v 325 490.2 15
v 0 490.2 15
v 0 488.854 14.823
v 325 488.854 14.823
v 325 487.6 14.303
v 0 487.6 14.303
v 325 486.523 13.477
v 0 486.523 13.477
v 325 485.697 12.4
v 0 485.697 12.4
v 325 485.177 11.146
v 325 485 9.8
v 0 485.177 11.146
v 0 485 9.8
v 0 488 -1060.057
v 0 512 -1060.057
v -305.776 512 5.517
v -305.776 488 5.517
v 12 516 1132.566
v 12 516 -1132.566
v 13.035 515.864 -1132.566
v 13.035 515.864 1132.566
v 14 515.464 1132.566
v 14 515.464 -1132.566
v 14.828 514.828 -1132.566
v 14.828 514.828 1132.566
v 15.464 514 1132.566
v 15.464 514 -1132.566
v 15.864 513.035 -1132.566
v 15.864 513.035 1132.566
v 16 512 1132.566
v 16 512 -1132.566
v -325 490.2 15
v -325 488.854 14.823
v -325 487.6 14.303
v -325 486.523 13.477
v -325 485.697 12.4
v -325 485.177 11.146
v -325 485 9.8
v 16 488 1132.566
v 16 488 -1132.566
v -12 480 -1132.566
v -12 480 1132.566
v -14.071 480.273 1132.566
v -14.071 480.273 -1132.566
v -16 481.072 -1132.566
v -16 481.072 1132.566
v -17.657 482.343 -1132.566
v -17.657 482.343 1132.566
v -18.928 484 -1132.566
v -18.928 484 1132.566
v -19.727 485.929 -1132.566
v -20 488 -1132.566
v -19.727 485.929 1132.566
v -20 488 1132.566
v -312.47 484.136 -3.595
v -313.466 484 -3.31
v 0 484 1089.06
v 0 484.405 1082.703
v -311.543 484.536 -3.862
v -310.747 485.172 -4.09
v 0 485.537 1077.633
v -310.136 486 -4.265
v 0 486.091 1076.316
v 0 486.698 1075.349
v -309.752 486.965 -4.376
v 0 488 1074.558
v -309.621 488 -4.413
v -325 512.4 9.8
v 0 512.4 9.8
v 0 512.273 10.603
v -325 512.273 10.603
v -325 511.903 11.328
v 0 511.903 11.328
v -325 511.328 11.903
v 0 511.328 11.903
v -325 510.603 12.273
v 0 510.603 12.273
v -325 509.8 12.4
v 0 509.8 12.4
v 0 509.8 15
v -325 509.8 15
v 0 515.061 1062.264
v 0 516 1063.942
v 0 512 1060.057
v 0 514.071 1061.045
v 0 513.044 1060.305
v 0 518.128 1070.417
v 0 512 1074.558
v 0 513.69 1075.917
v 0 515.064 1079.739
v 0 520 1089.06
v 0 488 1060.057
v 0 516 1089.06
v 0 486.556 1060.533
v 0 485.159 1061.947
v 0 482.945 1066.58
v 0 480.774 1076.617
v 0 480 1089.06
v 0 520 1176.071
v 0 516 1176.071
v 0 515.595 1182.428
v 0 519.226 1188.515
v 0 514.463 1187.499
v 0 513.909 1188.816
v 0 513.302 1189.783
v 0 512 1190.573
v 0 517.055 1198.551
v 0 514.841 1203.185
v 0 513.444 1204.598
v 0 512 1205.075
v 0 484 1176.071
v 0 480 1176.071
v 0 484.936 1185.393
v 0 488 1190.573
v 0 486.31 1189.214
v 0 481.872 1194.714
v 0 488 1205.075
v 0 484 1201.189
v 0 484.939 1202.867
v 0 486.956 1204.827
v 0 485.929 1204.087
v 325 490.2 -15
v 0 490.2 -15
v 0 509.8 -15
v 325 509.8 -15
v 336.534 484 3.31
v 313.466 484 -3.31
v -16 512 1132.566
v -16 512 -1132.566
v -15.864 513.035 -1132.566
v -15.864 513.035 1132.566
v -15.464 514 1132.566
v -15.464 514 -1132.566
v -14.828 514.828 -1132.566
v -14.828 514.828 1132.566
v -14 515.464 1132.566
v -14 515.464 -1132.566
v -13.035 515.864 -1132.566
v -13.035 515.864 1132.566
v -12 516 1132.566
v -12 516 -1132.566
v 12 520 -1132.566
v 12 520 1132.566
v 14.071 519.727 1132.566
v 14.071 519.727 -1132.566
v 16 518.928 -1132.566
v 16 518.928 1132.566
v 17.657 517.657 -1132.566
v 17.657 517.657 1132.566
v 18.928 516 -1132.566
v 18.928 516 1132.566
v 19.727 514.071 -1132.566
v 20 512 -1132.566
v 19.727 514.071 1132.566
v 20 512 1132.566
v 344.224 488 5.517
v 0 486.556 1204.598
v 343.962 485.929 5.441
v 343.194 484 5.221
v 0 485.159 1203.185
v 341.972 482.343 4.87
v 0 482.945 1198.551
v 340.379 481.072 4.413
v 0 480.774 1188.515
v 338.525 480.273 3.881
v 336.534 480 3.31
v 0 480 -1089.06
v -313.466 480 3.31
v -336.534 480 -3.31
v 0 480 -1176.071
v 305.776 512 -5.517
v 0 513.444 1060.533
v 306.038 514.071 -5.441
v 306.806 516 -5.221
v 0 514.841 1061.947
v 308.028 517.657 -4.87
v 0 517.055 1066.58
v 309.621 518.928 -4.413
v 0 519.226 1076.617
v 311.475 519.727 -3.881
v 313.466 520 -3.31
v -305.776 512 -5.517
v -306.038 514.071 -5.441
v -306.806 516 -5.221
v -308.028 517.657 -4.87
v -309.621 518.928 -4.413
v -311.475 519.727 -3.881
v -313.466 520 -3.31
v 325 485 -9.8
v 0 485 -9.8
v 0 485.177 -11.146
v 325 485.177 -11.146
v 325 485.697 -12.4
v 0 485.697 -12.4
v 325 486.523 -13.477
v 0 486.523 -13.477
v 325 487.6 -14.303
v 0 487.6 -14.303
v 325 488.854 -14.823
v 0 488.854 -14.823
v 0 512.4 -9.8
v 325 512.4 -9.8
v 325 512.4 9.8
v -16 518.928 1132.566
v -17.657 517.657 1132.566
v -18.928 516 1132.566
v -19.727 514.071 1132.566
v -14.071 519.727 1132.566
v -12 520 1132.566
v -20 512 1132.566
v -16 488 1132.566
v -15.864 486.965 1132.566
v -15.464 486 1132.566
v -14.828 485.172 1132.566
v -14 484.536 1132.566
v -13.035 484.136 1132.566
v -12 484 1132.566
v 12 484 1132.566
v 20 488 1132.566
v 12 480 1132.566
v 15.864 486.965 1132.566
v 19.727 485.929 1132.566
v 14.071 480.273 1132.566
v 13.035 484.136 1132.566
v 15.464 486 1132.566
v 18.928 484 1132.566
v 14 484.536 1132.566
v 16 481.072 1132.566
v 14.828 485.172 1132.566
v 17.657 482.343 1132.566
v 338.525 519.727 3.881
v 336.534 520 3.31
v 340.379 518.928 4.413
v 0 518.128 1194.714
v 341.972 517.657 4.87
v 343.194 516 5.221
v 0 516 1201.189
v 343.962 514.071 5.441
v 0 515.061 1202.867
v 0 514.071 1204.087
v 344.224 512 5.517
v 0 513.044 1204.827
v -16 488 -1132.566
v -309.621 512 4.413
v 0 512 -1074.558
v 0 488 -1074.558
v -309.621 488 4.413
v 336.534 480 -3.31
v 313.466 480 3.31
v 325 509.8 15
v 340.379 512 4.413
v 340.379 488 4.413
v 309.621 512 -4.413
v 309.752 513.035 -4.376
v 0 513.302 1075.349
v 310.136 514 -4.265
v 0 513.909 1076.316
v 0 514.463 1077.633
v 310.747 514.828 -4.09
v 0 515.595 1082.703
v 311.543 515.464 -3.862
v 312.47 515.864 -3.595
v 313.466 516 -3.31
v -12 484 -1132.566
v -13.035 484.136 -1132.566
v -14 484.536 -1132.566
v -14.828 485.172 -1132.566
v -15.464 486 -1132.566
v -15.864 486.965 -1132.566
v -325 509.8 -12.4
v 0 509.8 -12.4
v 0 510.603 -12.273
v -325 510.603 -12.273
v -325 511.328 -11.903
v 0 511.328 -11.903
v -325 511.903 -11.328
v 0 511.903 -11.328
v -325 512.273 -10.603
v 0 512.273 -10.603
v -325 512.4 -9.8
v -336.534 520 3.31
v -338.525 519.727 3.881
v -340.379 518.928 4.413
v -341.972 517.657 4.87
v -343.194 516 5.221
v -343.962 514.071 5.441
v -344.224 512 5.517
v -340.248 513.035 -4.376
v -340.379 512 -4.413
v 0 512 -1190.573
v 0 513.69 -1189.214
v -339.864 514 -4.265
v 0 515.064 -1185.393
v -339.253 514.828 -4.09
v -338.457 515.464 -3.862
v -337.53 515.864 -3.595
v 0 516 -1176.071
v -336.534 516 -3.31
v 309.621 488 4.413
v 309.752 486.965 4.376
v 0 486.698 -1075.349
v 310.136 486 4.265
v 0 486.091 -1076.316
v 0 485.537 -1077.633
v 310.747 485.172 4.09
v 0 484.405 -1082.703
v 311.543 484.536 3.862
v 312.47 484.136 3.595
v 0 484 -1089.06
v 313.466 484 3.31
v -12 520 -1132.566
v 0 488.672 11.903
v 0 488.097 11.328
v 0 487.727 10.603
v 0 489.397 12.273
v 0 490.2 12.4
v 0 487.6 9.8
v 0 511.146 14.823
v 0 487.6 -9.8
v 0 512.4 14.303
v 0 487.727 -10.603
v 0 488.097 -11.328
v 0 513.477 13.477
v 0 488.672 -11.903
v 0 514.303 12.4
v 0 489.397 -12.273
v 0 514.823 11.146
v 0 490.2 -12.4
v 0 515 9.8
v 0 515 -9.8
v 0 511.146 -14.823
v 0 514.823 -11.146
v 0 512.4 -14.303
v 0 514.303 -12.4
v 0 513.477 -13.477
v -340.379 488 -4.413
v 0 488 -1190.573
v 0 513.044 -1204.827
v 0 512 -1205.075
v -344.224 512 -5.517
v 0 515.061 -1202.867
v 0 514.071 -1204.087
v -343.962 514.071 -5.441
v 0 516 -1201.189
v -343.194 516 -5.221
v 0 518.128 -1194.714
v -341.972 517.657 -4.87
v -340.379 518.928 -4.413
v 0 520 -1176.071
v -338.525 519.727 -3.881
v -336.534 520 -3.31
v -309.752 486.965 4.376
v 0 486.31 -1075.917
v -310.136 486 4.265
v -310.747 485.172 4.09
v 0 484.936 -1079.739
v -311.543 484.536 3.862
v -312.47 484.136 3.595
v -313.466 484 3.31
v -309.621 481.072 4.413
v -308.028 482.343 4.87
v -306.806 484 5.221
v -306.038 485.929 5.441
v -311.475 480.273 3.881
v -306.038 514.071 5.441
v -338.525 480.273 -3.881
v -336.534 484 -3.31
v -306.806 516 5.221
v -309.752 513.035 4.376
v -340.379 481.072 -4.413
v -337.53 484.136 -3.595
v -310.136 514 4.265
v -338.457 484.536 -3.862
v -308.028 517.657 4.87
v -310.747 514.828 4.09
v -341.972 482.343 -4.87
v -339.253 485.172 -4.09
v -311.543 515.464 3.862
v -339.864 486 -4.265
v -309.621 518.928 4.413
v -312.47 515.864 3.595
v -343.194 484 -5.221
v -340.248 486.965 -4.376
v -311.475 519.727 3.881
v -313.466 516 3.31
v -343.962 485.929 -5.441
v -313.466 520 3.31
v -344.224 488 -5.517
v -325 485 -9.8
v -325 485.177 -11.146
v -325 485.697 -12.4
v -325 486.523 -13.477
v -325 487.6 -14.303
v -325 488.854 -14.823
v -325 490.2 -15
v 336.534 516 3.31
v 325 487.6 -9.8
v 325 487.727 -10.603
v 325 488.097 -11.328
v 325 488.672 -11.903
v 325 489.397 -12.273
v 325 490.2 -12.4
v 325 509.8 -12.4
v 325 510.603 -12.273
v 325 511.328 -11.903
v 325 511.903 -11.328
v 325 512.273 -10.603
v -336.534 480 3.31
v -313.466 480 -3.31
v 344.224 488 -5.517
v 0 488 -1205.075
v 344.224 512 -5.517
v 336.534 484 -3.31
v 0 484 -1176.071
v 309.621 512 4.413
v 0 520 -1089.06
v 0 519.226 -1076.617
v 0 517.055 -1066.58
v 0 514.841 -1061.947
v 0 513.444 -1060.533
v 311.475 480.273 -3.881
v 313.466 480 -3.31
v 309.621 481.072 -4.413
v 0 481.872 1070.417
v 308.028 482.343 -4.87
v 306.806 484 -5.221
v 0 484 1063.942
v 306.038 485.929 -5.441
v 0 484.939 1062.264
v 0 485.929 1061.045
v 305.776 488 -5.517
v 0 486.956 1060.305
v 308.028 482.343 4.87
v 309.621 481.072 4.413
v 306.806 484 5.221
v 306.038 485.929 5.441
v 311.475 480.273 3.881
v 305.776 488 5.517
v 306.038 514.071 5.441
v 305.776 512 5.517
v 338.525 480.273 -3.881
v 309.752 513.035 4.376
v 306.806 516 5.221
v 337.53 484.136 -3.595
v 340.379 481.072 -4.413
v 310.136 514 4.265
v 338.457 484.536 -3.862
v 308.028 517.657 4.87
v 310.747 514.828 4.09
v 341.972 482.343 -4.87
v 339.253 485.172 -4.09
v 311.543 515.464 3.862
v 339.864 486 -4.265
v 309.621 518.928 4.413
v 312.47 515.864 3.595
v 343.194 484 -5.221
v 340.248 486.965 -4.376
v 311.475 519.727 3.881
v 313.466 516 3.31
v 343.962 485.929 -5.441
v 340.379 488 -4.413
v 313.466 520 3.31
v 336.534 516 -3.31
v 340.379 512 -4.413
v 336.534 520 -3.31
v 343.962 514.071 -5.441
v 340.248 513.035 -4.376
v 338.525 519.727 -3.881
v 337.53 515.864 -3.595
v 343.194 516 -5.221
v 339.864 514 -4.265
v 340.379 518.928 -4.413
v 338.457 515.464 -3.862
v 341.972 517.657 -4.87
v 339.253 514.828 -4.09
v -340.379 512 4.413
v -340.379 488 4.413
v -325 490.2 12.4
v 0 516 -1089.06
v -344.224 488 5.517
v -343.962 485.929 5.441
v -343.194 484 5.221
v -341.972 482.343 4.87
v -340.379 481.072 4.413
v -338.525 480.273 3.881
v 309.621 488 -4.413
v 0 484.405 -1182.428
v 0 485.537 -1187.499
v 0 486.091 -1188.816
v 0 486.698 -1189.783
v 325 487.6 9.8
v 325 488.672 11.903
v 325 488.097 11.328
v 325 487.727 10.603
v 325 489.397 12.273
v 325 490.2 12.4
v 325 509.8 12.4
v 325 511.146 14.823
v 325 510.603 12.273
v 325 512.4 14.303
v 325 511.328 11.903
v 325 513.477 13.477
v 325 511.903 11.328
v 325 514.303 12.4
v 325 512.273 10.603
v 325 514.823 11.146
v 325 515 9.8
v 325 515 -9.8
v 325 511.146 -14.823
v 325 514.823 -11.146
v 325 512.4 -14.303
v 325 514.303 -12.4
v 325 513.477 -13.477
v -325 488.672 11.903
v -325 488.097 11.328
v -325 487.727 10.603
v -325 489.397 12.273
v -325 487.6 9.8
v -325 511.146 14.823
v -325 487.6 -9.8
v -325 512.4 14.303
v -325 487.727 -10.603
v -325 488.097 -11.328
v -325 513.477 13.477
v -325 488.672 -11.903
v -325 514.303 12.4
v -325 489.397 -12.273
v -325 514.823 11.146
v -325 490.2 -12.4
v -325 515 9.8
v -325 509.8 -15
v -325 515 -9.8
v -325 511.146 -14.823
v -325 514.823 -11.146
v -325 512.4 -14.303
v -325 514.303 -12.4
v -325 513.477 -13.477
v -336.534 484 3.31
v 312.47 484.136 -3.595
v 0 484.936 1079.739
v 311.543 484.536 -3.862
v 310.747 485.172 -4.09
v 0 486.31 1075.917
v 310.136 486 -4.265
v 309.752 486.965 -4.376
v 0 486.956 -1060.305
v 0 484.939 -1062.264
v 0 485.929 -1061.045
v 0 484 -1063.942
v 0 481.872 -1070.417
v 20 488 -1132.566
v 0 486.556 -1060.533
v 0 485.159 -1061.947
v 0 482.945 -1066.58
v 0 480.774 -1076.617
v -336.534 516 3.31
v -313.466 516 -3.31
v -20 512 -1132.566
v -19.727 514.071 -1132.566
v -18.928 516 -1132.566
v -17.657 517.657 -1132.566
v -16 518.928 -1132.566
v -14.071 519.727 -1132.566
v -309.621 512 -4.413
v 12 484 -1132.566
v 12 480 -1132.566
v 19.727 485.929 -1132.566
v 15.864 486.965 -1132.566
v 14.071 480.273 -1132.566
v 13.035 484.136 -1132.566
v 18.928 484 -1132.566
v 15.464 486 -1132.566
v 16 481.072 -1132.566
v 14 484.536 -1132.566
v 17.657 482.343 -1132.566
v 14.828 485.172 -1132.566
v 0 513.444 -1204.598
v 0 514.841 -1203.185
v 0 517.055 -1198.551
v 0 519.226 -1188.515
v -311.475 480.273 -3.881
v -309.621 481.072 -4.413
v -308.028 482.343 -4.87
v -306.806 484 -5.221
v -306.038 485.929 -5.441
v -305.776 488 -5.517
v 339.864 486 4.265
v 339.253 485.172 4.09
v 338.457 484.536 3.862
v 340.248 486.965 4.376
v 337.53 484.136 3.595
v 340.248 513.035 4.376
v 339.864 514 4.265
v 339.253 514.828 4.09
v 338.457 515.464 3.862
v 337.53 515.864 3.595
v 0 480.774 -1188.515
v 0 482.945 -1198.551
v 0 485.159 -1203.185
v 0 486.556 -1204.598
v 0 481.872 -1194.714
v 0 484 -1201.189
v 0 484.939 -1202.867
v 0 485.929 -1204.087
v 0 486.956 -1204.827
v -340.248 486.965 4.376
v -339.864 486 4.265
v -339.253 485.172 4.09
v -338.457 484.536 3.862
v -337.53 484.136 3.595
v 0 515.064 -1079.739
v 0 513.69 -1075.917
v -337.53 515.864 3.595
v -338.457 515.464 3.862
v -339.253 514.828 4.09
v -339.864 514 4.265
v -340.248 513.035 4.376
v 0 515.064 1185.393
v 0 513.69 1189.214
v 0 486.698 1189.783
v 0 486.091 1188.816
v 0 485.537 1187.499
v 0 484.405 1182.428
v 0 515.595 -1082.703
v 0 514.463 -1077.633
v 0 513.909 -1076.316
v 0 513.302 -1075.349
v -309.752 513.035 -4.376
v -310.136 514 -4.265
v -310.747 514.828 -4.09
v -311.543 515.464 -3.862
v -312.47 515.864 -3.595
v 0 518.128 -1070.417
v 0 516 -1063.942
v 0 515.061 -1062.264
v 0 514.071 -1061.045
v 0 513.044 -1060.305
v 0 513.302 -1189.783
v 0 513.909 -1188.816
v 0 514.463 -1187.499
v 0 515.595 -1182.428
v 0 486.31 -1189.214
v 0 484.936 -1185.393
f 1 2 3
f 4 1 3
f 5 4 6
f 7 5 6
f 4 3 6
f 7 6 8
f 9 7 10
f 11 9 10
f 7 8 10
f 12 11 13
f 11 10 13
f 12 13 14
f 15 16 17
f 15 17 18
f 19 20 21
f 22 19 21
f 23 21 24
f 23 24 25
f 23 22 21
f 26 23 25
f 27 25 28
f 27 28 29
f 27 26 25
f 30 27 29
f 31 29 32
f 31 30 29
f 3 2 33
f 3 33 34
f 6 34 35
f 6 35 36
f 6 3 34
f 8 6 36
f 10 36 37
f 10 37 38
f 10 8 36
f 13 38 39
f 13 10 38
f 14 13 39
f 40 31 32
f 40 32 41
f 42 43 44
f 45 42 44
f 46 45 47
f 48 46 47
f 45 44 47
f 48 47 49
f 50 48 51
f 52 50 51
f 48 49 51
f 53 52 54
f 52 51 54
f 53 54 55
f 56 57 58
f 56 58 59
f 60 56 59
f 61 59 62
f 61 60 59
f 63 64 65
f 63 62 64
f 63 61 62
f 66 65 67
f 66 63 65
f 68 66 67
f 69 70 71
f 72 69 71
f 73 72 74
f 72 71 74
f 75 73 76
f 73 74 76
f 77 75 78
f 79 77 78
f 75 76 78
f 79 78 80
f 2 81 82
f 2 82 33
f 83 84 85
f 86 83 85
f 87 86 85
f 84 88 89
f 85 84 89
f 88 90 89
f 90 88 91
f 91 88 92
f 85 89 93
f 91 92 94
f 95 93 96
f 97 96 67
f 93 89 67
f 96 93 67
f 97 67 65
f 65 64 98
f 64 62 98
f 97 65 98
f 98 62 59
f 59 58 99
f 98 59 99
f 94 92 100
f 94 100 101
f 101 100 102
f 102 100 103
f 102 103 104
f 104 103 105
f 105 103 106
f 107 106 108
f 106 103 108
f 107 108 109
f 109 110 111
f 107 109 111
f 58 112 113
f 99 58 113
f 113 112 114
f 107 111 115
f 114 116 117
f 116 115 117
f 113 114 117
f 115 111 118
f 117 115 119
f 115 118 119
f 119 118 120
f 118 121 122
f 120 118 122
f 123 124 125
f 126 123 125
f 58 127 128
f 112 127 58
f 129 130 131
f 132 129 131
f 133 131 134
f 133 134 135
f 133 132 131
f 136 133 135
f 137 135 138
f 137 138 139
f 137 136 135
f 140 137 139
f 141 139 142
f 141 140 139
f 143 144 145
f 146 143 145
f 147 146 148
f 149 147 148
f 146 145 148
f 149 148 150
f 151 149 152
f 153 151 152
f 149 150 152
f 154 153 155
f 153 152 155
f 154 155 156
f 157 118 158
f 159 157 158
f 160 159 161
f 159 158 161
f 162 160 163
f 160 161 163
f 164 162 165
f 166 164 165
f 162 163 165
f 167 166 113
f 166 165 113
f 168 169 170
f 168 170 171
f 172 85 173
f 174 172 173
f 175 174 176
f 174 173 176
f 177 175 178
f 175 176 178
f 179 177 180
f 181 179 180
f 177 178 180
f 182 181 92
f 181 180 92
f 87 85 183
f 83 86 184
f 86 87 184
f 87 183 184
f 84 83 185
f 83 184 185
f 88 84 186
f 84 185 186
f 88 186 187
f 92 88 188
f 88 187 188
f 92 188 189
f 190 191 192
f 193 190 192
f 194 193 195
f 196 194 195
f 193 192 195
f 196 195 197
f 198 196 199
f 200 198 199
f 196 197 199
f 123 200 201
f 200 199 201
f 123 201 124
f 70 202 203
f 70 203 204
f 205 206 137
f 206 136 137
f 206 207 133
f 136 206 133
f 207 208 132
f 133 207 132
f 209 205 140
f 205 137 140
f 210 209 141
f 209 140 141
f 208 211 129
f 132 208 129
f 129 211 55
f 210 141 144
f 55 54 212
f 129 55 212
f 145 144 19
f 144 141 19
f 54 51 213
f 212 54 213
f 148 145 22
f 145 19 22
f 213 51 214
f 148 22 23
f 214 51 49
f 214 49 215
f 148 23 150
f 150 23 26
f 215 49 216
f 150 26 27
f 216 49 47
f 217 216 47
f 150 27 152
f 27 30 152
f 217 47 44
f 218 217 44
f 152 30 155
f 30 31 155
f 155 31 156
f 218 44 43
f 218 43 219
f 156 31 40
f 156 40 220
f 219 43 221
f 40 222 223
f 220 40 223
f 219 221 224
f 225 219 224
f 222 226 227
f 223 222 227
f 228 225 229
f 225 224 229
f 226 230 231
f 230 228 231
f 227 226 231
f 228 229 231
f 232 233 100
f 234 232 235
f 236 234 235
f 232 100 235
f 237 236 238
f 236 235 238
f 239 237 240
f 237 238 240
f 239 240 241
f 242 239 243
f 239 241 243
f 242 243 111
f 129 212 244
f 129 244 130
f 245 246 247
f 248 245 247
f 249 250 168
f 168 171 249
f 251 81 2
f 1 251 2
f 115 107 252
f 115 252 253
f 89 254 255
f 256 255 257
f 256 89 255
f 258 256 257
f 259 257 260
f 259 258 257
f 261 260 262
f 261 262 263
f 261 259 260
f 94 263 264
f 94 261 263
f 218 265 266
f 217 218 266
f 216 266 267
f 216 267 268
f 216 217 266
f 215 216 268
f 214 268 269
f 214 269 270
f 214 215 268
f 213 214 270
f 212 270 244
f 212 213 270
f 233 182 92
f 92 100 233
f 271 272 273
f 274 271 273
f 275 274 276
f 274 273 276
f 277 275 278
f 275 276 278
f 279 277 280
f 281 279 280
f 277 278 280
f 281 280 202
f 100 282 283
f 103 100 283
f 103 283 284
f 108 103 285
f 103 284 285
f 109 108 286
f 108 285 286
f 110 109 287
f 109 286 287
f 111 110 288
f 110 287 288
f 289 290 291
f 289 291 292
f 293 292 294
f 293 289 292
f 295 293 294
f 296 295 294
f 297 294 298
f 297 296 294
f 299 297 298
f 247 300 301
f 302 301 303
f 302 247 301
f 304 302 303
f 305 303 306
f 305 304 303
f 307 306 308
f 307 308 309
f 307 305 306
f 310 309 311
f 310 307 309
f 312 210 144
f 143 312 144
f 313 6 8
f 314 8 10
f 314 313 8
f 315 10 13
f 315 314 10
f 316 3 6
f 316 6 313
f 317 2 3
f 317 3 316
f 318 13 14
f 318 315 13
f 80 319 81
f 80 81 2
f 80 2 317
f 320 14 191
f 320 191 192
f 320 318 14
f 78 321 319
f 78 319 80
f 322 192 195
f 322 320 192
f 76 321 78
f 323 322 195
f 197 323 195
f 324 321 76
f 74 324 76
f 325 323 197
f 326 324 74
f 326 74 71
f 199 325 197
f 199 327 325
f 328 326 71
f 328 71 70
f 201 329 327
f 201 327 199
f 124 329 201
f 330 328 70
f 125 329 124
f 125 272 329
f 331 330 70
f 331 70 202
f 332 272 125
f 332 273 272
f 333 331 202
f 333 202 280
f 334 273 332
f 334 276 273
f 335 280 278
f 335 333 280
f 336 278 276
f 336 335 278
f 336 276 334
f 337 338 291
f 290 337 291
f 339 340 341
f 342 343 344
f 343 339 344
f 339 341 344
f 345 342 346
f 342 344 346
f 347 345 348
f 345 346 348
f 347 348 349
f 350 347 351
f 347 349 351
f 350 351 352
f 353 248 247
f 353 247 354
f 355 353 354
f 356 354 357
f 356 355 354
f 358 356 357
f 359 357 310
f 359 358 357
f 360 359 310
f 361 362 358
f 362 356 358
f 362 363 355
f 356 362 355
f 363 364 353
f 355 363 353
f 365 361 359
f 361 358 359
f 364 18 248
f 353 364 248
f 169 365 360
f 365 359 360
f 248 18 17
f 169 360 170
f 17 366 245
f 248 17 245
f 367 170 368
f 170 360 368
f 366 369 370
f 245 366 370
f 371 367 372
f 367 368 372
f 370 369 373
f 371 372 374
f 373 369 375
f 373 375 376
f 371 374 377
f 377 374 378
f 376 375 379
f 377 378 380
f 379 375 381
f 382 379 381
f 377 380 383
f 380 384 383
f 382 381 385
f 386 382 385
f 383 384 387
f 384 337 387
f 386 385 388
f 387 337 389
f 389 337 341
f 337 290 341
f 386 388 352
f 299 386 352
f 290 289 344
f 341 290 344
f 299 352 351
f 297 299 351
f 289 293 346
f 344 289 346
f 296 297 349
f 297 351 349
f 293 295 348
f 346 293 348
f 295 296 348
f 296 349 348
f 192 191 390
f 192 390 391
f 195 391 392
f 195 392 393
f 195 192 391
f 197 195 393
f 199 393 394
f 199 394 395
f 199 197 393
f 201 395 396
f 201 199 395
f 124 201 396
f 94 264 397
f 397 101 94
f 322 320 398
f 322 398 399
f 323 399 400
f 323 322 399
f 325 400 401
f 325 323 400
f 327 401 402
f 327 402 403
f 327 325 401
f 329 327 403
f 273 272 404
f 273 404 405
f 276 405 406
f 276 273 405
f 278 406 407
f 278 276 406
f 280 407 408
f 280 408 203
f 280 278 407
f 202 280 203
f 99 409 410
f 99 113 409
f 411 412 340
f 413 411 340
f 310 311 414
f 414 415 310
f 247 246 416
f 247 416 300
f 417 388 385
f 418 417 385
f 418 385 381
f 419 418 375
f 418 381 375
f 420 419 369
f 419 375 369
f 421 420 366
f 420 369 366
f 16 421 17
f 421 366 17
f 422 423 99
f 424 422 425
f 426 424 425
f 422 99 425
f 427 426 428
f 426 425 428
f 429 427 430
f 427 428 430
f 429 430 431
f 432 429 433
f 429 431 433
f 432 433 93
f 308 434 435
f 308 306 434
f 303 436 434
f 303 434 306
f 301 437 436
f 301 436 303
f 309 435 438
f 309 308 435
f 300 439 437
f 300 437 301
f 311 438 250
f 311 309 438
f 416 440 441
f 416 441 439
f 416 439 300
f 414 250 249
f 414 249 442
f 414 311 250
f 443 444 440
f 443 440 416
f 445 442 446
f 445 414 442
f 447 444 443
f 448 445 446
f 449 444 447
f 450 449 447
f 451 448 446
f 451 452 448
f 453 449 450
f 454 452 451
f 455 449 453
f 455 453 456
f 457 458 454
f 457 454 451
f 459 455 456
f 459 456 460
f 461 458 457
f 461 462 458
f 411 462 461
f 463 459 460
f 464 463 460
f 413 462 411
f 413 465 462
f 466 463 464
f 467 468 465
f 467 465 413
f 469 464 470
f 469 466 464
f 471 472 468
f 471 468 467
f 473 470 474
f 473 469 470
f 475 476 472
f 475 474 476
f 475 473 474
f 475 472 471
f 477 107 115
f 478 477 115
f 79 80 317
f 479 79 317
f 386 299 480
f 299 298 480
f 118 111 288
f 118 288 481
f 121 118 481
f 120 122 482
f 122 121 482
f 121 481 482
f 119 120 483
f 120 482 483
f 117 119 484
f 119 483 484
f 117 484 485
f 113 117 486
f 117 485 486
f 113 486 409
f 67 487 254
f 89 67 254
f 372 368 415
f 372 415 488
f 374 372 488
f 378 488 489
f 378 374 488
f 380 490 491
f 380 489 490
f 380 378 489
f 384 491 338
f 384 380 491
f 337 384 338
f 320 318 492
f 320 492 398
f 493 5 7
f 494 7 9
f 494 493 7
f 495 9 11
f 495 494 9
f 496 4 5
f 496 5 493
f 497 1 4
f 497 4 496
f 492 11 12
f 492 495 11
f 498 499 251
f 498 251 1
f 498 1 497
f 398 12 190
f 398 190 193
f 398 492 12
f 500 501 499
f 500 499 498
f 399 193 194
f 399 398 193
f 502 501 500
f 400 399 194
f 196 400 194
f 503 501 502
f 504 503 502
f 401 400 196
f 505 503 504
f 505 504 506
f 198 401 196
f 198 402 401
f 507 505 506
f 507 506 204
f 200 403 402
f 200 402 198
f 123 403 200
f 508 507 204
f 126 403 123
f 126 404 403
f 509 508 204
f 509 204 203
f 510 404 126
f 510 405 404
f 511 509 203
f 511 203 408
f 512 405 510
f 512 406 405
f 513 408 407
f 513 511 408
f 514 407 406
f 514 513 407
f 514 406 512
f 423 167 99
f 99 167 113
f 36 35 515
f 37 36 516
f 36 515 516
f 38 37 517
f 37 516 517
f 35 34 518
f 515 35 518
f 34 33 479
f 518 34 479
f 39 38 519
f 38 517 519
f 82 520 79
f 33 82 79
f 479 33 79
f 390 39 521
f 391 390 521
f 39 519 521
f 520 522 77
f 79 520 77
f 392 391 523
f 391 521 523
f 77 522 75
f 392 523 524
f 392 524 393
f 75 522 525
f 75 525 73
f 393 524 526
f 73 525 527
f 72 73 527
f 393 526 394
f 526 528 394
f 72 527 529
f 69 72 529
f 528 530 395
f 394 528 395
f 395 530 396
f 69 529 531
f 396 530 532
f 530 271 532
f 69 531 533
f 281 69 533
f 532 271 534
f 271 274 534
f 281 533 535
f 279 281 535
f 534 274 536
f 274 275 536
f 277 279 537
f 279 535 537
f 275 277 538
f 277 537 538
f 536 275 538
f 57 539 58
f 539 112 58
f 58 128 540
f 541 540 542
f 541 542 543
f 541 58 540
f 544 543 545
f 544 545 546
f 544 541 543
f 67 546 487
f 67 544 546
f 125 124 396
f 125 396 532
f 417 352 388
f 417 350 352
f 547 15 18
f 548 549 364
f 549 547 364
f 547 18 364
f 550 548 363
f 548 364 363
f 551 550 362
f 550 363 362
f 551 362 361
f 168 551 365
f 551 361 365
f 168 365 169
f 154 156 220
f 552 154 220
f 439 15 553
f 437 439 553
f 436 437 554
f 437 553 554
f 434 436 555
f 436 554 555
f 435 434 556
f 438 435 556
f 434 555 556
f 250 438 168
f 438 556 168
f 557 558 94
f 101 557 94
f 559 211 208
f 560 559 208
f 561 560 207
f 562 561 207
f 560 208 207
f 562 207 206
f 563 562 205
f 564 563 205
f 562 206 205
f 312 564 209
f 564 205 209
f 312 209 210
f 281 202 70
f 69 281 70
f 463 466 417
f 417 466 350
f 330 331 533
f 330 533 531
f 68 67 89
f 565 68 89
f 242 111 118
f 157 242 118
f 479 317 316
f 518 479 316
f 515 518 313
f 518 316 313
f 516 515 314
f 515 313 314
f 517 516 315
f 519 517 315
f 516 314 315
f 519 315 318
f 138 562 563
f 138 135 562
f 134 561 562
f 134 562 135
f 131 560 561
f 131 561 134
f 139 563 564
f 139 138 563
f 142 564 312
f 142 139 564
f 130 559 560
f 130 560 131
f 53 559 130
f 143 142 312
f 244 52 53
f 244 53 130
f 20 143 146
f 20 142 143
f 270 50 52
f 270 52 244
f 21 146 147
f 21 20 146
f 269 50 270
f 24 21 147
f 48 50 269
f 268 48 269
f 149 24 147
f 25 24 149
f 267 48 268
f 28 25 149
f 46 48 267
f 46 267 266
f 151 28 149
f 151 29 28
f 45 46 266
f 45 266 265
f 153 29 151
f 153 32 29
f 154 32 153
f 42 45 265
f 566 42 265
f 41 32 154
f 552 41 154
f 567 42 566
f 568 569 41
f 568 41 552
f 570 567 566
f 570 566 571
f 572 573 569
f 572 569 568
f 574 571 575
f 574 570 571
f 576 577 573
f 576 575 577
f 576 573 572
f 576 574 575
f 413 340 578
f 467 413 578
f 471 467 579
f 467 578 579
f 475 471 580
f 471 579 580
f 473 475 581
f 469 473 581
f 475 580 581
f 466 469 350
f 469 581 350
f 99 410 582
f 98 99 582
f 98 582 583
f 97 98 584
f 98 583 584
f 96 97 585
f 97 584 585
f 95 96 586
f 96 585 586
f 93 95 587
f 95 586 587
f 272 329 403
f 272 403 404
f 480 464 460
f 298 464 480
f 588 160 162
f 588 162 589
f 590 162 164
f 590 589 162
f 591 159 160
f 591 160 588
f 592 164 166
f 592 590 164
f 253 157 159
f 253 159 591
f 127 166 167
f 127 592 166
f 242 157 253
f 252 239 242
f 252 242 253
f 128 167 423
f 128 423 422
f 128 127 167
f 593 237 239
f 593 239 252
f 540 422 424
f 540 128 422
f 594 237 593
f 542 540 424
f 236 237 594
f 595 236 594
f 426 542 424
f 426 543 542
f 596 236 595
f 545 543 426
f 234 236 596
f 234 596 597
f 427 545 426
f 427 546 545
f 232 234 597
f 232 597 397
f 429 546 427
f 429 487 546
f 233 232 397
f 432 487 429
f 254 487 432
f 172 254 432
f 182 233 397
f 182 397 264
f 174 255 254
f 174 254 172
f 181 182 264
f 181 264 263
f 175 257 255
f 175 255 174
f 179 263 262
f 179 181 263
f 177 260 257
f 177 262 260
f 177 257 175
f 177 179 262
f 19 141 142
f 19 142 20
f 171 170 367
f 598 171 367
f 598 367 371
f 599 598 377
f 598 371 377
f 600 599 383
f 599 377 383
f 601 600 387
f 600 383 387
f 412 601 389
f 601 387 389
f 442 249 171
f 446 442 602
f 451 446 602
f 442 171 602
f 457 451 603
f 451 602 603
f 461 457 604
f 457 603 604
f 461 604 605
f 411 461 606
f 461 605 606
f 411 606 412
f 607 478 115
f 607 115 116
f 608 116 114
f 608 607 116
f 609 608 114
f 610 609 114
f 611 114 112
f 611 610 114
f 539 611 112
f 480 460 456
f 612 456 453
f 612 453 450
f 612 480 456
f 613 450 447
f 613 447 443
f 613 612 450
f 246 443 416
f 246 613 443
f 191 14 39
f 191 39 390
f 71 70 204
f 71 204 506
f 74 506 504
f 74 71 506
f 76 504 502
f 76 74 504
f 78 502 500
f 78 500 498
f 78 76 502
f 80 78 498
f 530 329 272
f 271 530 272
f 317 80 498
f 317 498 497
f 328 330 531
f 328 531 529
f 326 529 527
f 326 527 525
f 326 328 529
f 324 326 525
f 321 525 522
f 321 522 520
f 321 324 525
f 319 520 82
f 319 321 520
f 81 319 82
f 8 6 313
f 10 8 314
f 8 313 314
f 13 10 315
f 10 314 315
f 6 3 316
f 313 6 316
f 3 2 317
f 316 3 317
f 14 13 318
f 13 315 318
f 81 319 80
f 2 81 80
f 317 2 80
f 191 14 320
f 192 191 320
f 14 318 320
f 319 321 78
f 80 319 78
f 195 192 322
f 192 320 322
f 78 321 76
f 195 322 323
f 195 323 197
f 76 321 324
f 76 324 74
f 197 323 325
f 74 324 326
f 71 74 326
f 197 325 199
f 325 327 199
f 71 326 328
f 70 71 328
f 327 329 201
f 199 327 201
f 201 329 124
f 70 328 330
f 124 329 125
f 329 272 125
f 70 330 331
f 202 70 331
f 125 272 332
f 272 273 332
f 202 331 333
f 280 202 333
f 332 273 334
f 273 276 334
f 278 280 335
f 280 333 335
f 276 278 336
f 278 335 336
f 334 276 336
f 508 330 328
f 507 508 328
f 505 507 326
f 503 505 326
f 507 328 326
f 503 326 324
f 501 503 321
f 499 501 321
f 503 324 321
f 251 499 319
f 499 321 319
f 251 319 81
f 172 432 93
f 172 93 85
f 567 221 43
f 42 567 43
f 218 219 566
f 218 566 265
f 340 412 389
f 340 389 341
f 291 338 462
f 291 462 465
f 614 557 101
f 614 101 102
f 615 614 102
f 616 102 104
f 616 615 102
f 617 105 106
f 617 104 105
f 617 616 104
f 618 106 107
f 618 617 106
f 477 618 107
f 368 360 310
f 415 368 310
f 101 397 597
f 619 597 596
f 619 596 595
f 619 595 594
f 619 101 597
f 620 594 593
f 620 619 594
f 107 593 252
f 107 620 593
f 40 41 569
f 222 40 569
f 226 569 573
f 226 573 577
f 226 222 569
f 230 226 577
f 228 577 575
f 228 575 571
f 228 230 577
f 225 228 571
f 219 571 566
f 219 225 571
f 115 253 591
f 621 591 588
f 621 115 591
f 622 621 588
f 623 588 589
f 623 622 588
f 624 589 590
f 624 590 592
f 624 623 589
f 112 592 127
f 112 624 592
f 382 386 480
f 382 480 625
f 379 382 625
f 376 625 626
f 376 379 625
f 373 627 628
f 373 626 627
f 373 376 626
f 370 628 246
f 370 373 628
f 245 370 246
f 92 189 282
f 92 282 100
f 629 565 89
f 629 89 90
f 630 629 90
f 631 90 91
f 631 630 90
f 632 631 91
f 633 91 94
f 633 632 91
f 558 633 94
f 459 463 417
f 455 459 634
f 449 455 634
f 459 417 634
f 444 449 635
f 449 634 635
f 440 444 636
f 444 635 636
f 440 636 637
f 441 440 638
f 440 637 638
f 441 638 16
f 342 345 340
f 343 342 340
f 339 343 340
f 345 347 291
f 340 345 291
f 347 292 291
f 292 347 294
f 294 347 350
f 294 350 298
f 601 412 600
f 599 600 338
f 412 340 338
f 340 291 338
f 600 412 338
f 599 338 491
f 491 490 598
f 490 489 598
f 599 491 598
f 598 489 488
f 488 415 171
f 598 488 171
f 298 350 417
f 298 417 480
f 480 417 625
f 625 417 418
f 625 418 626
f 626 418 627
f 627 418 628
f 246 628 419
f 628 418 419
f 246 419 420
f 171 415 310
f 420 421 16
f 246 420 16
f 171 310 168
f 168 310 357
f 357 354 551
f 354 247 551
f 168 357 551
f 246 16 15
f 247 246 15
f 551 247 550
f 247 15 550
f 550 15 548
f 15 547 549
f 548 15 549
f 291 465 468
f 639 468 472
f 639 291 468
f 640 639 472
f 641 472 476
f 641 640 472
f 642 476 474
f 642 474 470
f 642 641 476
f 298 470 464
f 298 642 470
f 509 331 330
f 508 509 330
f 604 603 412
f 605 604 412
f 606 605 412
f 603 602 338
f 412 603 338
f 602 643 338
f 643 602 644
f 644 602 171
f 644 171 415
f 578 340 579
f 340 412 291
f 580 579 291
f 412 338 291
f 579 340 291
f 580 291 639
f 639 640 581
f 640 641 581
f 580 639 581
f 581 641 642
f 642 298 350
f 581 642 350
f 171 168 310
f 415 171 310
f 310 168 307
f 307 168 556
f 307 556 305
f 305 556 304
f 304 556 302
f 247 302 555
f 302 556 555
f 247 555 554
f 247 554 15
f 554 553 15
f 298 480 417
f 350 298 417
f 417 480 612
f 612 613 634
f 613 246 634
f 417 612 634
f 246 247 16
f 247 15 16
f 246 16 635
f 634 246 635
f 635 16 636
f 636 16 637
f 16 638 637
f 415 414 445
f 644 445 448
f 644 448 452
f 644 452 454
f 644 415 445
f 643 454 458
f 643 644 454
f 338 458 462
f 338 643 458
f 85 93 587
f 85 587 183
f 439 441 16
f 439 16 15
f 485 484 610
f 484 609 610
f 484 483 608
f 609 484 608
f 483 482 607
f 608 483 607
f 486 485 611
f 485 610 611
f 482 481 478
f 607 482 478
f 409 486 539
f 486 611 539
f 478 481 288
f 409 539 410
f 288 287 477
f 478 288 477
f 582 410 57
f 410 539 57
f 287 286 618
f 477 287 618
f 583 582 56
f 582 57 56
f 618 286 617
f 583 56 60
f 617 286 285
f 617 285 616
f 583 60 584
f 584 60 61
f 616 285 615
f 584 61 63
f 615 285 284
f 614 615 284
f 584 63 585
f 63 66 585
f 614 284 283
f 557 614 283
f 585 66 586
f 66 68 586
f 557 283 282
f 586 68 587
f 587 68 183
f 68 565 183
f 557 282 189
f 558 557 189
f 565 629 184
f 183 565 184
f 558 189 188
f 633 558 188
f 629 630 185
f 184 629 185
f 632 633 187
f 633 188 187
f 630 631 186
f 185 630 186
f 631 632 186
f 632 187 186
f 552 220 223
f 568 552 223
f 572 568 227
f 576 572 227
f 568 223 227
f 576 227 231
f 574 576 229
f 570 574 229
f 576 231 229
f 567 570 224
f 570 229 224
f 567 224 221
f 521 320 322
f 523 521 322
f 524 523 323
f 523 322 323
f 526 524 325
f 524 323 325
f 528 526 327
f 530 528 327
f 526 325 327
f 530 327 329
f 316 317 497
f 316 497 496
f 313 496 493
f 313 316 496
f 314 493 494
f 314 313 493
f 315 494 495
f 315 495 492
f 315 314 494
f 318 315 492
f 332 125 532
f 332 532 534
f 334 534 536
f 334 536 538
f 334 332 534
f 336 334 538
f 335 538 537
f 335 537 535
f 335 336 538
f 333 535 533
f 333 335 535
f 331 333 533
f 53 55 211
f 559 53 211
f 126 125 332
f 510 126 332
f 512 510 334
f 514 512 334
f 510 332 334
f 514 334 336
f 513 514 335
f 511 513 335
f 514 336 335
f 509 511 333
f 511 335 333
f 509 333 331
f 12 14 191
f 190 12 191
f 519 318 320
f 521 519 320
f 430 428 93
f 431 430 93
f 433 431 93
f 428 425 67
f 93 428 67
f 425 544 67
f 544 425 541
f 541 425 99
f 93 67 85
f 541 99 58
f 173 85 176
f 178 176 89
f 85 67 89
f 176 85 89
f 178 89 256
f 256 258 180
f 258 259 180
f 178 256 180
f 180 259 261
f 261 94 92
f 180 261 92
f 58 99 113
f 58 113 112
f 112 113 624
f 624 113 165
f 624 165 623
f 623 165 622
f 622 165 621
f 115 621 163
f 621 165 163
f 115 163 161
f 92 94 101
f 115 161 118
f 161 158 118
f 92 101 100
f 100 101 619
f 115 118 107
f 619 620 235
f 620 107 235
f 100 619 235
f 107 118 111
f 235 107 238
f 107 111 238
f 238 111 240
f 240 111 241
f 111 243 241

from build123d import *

# Parameters (mm, degrees)
SQUARE_TUBE_40_X_40_X_4_2_DEPTH        = 1277.839800624
SQUARE_TUBE_40_X_40_X_4_2_2_DEPTH      = 1178.274268897
SQUARE_TUBE_40_X_40_X_4_2_2_DEPTH_BACK = 99.565531726
SQUARE_TUBE_40_X_40_X_4_3_DEPTH        = 2265.131565932
SQUARE_TUBE_40_X_40_X_4_4_DEPTH        = 1277.839800624
SQUARE_TUBE_40_X_40_X_4_4_2_DEPTH      = 1178.274268897
SQUARE_TUBE_40_X_40_X_4_4_2_DEPTH_BACK = 99.565531726
SQUARE_TUBE_30_X_30_X_2_6_8_DEPTH      = 325
SQUARE_TUBE_30_X_30_X_2_6_8_2_DEPTH    = 325


with BuildPart() as part:
    # Sketch117 on segment 1 (carried to segment 1) → Square tube 40 X 40 X 4(2) (new body)
    with BuildSketch(Plane(origin=(-325, 500, 0), x_dir=(-0.961207261, 0, -0.275827122), z_dir=(0.275827122, 0, -0.961207261))):
        with BuildLine():
            Line((-12, -20), (12, -20))
            ThreePointArc((12, -20), (17.656854249, -17.656854249), (20, -12))
            Line((20, -12), (20, 12))
            ThreePointArc((20, 12), (17.656854249, 17.656854249), (12, 20))
            Line((12, 20), (-12, 20))
            ThreePointArc((-12, 20), (-17.656854249, 17.656854249), (-20, 12))
            Line((-20, 12), (-20, -12))
            ThreePointArc((-20, -12), (-17.656854249, -17.656854249), (-12, -20))
        make_face()
        with BuildLine():
            Line((-12, -16), (12, -16))
            ThreePointArc((12, -16), (14.828427125, -14.828427125), (16, -12))
            Line((16, -12), (16, 12))
            ThreePointArc((16, 12), (14.828427125, 14.828427125), (12, 16))
            Line((12, 16), (-12, 16))
            ThreePointArc((-12, 16), (-14.828427125, 14.828427125), (-16, 12))
            Line((-16, 12), (-16, -12))
            ThreePointArc((-16, -12), (-14.828427125, -14.828427125), (-12, -16))
        make_face(mode=Mode.SUBTRACT)
    extrude(amount=SQUARE_TUBE_40_X_40_X_4_2_DEPTH)

    # Square tube 40 X 40 X 4(2) mitre 1
    split(bisect_by=Plane(origin=(0, 500, -1132.565782966), x_dir=(0, -1, 0), z_dir=(-1, 0, 0)), keep=Keep.TOP)


with BuildPart() as body_2:
    # Sketch117 → Square tube 40 X 40 X 4_2 2 (new, two sides: drawn at the far end of the back side and taken through both)
    with BuildSketch(Plane(origin=(0, 500, -1132.565782966), x_dir=(0.9612072612142956, 2.0010330338498202e-15, -0.275827121561519), z_dir=(0.275827121561519, -1.4227899322223296e-14, 0.9612072612142956)).offset(-SQUARE_TUBE_40_X_40_X_4_2_2_DEPTH_BACK)):
        with BuildLine():
            Line((-12, -20), (12, -20))
            ThreePointArc((12, -20), (17.656854249, -17.656854249), (20, -12))
            Line((20, -12), (20, 12))
            ThreePointArc((20, 12), (17.656854249, 17.656854249), (12, 20))
            Line((12, 20), (-12, 20))
            ThreePointArc((-12, 20), (-17.656854249, 17.656854249), (-20, 12))
            Line((-20, 12), (-20, -12))
            ThreePointArc((-20, -12), (-17.656854249, -17.656854249), (-12, -20))
        make_face()
        with BuildLine():
            Line((-12, -16), (12, -16))
            ThreePointArc((12, -16), (14.828427125, -14.828427125), (16, -12))
            Line((16, -12), (16, 12))
            ThreePointArc((16, 12), (14.828427125, 14.828427125), (12, 16))
            Line((12, 16), (-12, 16))
            ThreePointArc((-12, 16), (-14.828427125, 14.828427125), (-16, 12))
            Line((-16, 12), (-16, -12))
            ThreePointArc((-16, -12), (-14.828427125, -14.828427125), (-12, -16))
        make_face(mode=Mode.SUBTRACT)
    extrude(amount=SQUARE_TUBE_40_X_40_X_4_2_2_DEPTH + SQUARE_TUBE_40_X_40_X_4_2_2_DEPTH_BACK)

    # Square tube 40 X 40 X 4_2 2 mitre 1
    split(bisect_by=Plane(origin=(0, 500, -1132.565782966), x_dir=(0, 1, 0), z_dir=(1, 0, 0)), keep=Keep.TOP)


with BuildPart() as body_3:
    # Sketch118 → Square tube 40 X 40 X 4(3) (new body)
    with BuildSketch(Plane(origin=(0, 500, 1132.565782966), x_dir=(1, 0, 0), z_dir=(0, 0, -1))):
        with BuildLine():
            Line((-12, -20), (12, -20))
            ThreePointArc((12, -20), (17.656854249, -17.656854249), (20, -12))
            Line((20, -12), (20, 12))
            ThreePointArc((20, 12), (17.656854249, 17.656854249), (12, 20))
            Line((12, 20), (-12, 20))
            ThreePointArc((-12, 20), (-17.656854249, 17.656854249), (-20, 12))
            Line((-20, 12), (-20, -12))
            ThreePointArc((-20, -12), (-17.656854249, -17.656854249), (-12, -20))
        make_face()
        with BuildLine():
            Line((-12, -16), (12, -16))
            ThreePointArc((12, -16), (14.828427125, -14.828427125), (16, -12))
            Line((16, -12), (16, 12))
            ThreePointArc((16, 12), (14.828427125, 14.828427125), (12, 16))
            Line((12, 16), (-12, 16))
            ThreePointArc((-12, 16), (-14.828427125, 14.828427125), (-16, 12))
            Line((-16, 12), (-16, -12))
            ThreePointArc((-16, -12), (-14.828427125, -14.828427125), (-12, -16))
        make_face(mode=Mode.SUBTRACT)
    extrude(amount=SQUARE_TUBE_40_X_40_X_4_3_DEPTH)


with BuildPart() as body_4:
    # Sketch119 on segment 1 (carried to segment 1) → Square tube 40 X 40 X 4(4) (new body)
    with BuildSketch(Plane(origin=(-325, 500, 0), x_dir=(0.961207261, 0, -0.275827122), z_dir=(0.275827122, 0, 0.961207261))):
        with BuildLine():
            Line((-12, -20), (12, -20))
            ThreePointArc((12, -20), (17.656854249, -17.656854249), (20, -12))
            Line((20, -12), (20, 12))
            ThreePointArc((20, 12), (17.656854249, 17.656854249), (12, 20))
            Line((12, 20), (-12, 20))
            ThreePointArc((-12, 20), (-17.656854249, 17.656854249), (-20, 12))
            Line((-20, 12), (-20, -12))
            ThreePointArc((-20, -12), (-17.656854249, -17.656854249), (-12, -20))
        make_face()
        with BuildLine():
            Line((-12, -16), (12, -16))
            ThreePointArc((12, -16), (14.828427125, -14.828427125), (16, -12))
            Line((16, -12), (16, 12))
            ThreePointArc((16, 12), (14.828427125, 14.828427125), (12, 16))
            Line((12, 16), (-12, 16))
            ThreePointArc((-12, 16), (-14.828427125, 14.828427125), (-16, 12))
            Line((-16, 12), (-16, -12))
            ThreePointArc((-16, -12), (-14.828427125, -14.828427125), (-12, -16))
        make_face(mode=Mode.SUBTRACT)
    extrude(amount=SQUARE_TUBE_40_X_40_X_4_4_DEPTH)

    # Square tube 40 X 40 X 4(4) mitre 1
    split(bisect_by=Plane(origin=(0, 500, 1132.565782966), x_dir=(0, -1, 0), z_dir=(-1, 0, 0)), keep=Keep.TOP)


with BuildPart() as body_5:
    # Sketch119 → Square tube 40 X 40 X 4_4 2 (new, two sides: drawn at the far end of the back side and taken through both)
    with BuildSketch(Plane(origin=(0, 500, 1132.565782966), x_dir=(-0.9612072612142956, 1.0116430648516472e-13, -0.2758271215615191), z_dir=(0.2758271215615191, -1.4227899322223312e-14, -0.9612072612142956)).offset(-SQUARE_TUBE_40_X_40_X_4_4_2_DEPTH_BACK)):
        with BuildLine():
            Line((-12, -20), (12, -20))
            ThreePointArc((12, -20), (17.656854249, -17.656854249), (20, -12))
            Line((20, -12), (20, 12))
            ThreePointArc((20, 12), (17.656854249, 17.656854249), (12, 20))
            Line((12, 20), (-12, 20))
            ThreePointArc((-12, 20), (-17.656854249, 17.656854249), (-20, 12))
            Line((-20, 12), (-20, -12))
            ThreePointArc((-20, -12), (-17.656854249, -17.656854249), (-12, -20))
        make_face()
        with BuildLine():
            Line((-12, -16), (12, -16))
            ThreePointArc((12, -16), (14.828427125, -14.828427125), (16, -12))
            Line((16, -12), (16, 12))
            ThreePointArc((16, 12), (14.828427125, 14.828427125), (12, 16))
            Line((12, 16), (-12, 16))
            ThreePointArc((-12, 16), (-14.828427125, 14.828427125), (-16, 12))
            Line((-16, 12), (-16, -12))
            ThreePointArc((-16, -12), (-14.828427125, -14.828427125), (-12, -16))
        make_face(mode=Mode.SUBTRACT)
    extrude(amount=SQUARE_TUBE_40_X_40_X_4_4_2_DEPTH + SQUARE_TUBE_40_X_40_X_4_4_2_DEPTH_BACK)

    # Square tube 40 X 40 X 4_4 2 mitre 1
    split(bisect_by=Plane(origin=(0, 500, 1132.565782966), x_dir=(0, 1, 0), z_dir=(1, 0, 0)), keep=Keep.TOP)


with BuildPart() as body_6:
    # Sketch123 → Square tube 30 X 30 X 2.6(8) (new body)
    with BuildSketch(Plane(origin=(0, 500, 0), x_dir=(0, 0, -1), z_dir=(1, 0, 0))):
        with BuildLine():
            Line((-9.8, -15), (9.8, -15))
            ThreePointArc((9.8, -15), (13.476955262, -13.476955262), (15, -9.8))
            Line((15, -9.8), (15, 9.8))
            ThreePointArc((15, 9.8), (13.476955262, 13.476955262), (9.8, 15))
            Line((9.8, 15), (-9.8, 15))
            ThreePointArc((-9.8, 15), (-13.476955262, 13.476955262), (-15, 9.8))
            Line((-15, 9.8), (-15, -9.8))
            ThreePointArc((-15, -9.8), (-13.476955262, -13.476955262), (-9.8, -15))
        make_face()
        with BuildLine():
            Line((-9.8, -12.4), (9.8, -12.4))
            ThreePointArc((9.8, -12.4), (11.638477631, -11.638477631), (12.4, -9.8))
            Line((12.4, -9.8), (12.4, 9.8))
            ThreePointArc((12.4, 9.8), (11.638477631, 11.638477631), (9.8, 12.4))
            Line((9.8, 12.4), (-9.8, 12.4))
            ThreePointArc((-9.8, 12.4), (-11.638477631, 11.638477631), (-12.4, 9.8))
            Line((-12.4, 9.8), (-12.4, -9.8))
            ThreePointArc((-12.4, -9.8), (-11.638477631, -11.638477631), (-9.8, -12.4))
        make_face(mode=Mode.SUBTRACT)
    extrude(amount=-SQUARE_TUBE_30_X_30_X_2_6_8_DEPTH)


with BuildPart() as body_7:
    # Sketch123 on segment 2 (carried to segment 2) → Square tube 30 X 30 X 2.6_8 2 (new body)
    with BuildSketch(Plane(origin=(0, 500, 0), x_dir=(0, 0, -1), z_dir=(1, 0, 0))):
        with BuildLine():
            Line((-9.8, -15), (9.8, -15))
            ThreePointArc((9.8, -15), (13.476955262, -13.476955262), (15, -9.8))
            Line((15, -9.8), (15, 9.8))
            ThreePointArc((15, 9.8), (13.476955262, 13.476955262), (9.8, 15))
            Line((9.8, 15), (-9.8, 15))
            ThreePointArc((-9.8, 15), (-13.476955262, 13.476955262), (-15, 9.8))
            Line((-15, 9.8), (-15, -9.8))
            ThreePointArc((-15, -9.8), (-13.476955262, -13.476955262), (-9.8, -15))
        make_face()
        with BuildLine():
            Line((-9.8, -12.4), (9.8, -12.4))
            ThreePointArc((9.8, -12.4), (11.638477631, -11.638477631), (12.4, -9.8))
            Line((12.4, -9.8), (12.4, 9.8))
            ThreePointArc((12.4, 9.8), (11.638477631, 11.638477631), (9.8, 12.4))
            Line((9.8, 12.4), (-9.8, 12.4))
            ThreePointArc((-9.8, 12.4), (-11.638477631, 11.638477631), (-12.4, 9.8))
            Line((-12.4, 9.8), (-12.4, -9.8))
            ThreePointArc((-12.4, -9.8), (-11.638477631, -11.638477631), (-9.8, -12.4))
        make_face(mode=Mode.SUBTRACT)
    extrude(amount=SQUARE_TUBE_30_X_30_X_2_6_8_2_DEPTH)


solid = Compound([part.part, body_2.part, body_3.part, body_4.part, body_5.part, body_6.part, body_7.part])
